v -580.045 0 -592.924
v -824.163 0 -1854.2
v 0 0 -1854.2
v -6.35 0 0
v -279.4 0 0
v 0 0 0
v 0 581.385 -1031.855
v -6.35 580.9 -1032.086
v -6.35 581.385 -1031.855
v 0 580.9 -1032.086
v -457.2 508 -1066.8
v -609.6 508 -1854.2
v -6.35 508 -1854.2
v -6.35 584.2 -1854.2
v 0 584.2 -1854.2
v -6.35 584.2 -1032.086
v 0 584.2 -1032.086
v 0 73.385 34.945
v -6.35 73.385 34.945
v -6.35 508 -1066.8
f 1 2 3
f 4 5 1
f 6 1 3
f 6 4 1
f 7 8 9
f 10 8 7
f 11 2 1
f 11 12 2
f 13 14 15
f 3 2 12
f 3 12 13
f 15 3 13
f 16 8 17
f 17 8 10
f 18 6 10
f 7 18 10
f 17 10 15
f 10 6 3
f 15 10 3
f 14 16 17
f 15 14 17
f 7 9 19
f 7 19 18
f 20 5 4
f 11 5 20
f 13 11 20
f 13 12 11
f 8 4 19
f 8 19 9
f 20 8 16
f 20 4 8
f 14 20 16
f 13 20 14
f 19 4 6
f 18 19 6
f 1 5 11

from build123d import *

# Parameters (mm, degrees)
BOSS_EXTRUDE1_DEPTH = 508
CUT_EXTRUDE1_DEPTH  = 508
BOSS_EXTRUDE2_DEPTH = 508
BOSS_EXTRUDE3_DEPTH = 635
CUT_EXTRUDE3_DEPTH  = 1016
CUT_EXTRUDE6_DEPTH  = 508
CUT_EXTRUDE7_DEPTH  = 1016
CUT_EXTRUDE8_DEPTH  = 1016
CUT_EXTRUDE9_DEPTH  = 1016
CUT_EXTRUDE10_DEPTH = 2092.737749488
SKETCH11_W          = 6.35
SKETCH11_H          = 822.114235363
BOSS_EXTRUDE4_DEPTH = 76.2
SKETCH12_W          = 6.35
SKETCH12_H          = 1181.577860321
BOSS_EXTRUDE5_DEPTH = 81.28


with BuildPart() as part:
    # Sketch1 → Boss-Extrude1 (new body)
    with BuildSketch(Plane(origin=(0, 0, 0), x_dir=(1, 0, 0), z_dir=(0, 1, 0))):
        Polygon((0, 1066.8), (0, 0), (279.4, 0), (457.2, 1066.8), align=None)
    boss_extrude1 = extrude(amount=BOSS_EXTRUDE1_DEPTH)

    # Sketch2 → Cut-Extrude1 (cut)
    with BuildSketch(Plane.ZY):
        Polygon((0, 0), (-1066.8, 508), (-1066.8, 732.672417782), (0, 732.672417782), align=None)
    cut_extrude1 = extrude(amount=-CUT_EXTRUDE1_DEPTH, mode=Mode.SUBTRACT)

    # Sketch3 → Boss-Extrude2 (add)
    with BuildSketch(Plane.XZ):
        Polygon((0, -1066.8), (0, -1854.2), (609.6, -1854.2), (457.2, -1066.8), align=None)
    boss_extrude2 = extrude(amount=-BOSS_EXTRUDE2_DEPTH)

    # Mirror1: Boss-Extrude1 across plane
    add(boss_extrude1.mirror(Plane(origin=(0, 508, -1066.8), x_dir=(0, 0, 1), z_dir=(1, 0, 0))))

    # Mirror1 2: Cut-Extrude1 across plane
    add(cut_extrude1.mirror(Plane(origin=(0, 508, -1066.8), x_dir=(0, 0, 1), z_dir=(1, 0, 0))), mode=Mode.SUBTRACT)


with BuildPart() as body_2:
    # Sketch4 → Boss-Extrude3 (new body)
    with BuildSketch(Plane.XZ):
        Polygon((279.4, 0), (758.024602406, -943.929756814), (824.163316724, -1854.2), (609.6, -1854.2), (473.605368522, -1854.2), (229.324151542, -858.00394067), align=None)
    boss_extrude3 = extrude(amount=-BOSS_EXTRUDE3_DEPTH)

    # Sketch5 → Cut-Extrude3 (cut)
    with BuildSketch(Plane(origin=(158.02566363, 112.959299077, 80.127753023), x_dir=(-0.31022668993908165, -0.22175505323400505, 0.924437178619848), z_dir=(-0.7520567447205982, -0.5375823192171424, -0.38133437136635806))):
        Polygon((-393.664649125, 703.625608499), (953.241894052, -176.928807588), (-1326.842790058, -923.556364957), (-2274.788319735, -628.326732027), (-2325.528348512, 172.375821483), align=None)
    cut_extrude3 = extrude(amount=-CUT_EXTRUDE3_DEPTH, mode=Mode.SUBTRACT)

    # Sketch6 → Cut-Extrude6 (cut)
    with BuildSketch(Plane(origin=(397.94007399, 254.27896004, 77.020659482), x_dir=(0.13564130705663138, 0.08667317707163243, -0.9869595717131874), z_dir=(0.8316697136780645, 0.5314270256083374, 0.16096833167962543))):
        Polygon((1082.533011894, 1261.854611528), (2538.800510351, 767.688534421), (2437.604130324, -1113.046367909), (306.999460867, -1023.580096849), align=None)
    cut_extrude6 = extrude(amount=CUT_EXTRUDE6_DEPTH, mode=Mode.SUBTRACT)

    # Sketch7 → Cut-Extrude7 (cut)
    with BuildSketch(Plane(origin=(0, 0, 0), x_dir=(1, 0, 0), z_dir=(0, 0.9028605188239303, 0.4299335803923477))):
        Polygon((0, 1181.577860321), (0, 0), (1197.045935399, 0), (1543.879463505, 955.927792479), (976.352766556, 2301.292030359), align=None)
    cut_extrude7 = extrude(amount=CUT_EXTRUDE7_DEPTH, mode=Mode.SUBTRACT)

    # Sketch8 → Cut-Extrude8 (cut)
    with BuildSketch(Plane(origin=(382.681643927, 161.632761359, 74.067414954), x_dir=(0.1616973556962576, 0.06829590736935992, -0.9844742933146776), z_dir=(0.9068988908525647, 0.38304573613058523, 0.1755288175843677))):
        Polygon((1197.556798458, 999.143883777), (2455.295967915, 323.49765858), (2410.705423203, -956.043074474), (776.288597468, -956.043074474), (430.351182168, -503.275200855), align=None)
    cut_extrude8 = extrude(amount=CUT_EXTRUDE8_DEPTH, mode=Mode.SUBTRACT)

    # Sketch9 → Cut-Extrude9 (cut)
    with BuildSketch(Plane(origin=(0, 508, 0), x_dir=(1, 0, 0), z_dir=(0, 1, 0))):
        Polygon((351.522364305, 2301.225932819), (1863.401978722, 1800.09916747), (1313.944223798, 629.194662402), (-286.938271333, 375.015467974), (-444.004316346, 1364.25568729), align=None)
    cut_extrude9 = extrude(amount=CUT_EXTRUDE9_DEPTH, mode=Mode.SUBTRACT)


with BuildPart() as part_1:
    add(part.part)

    # Mirror1 3: Boss-Extrude2, Boss-Extrude3 across plane
    add(boss_extrude2.mirror(Plane(origin=(0, 508, -1066.8), x_dir=(0, 0, 1), z_dir=(1, 0, 0))))
    add(boss_extrude3.mirror(Plane(origin=(0, 508, -1066.8), x_dir=(0, 0, 1), z_dir=(1, 0, 0))))

    # Mirror1 4: Cut-Extrude3, Cut-Extrude6, Cut-Extrude7, Cut-Extrude8, Cut-Extrude9 across plane
    add(cut_extrude3.mirror(Plane(origin=(0, 508, -1066.8), x_dir=(0, 0, 1), z_dir=(1, 0, 0))), mode=Mode.SUBTRACT)
    add(cut_extrude6.mirror(Plane(origin=(0, 508, -1066.8), x_dir=(0, 0, 1), z_dir=(1, 0, 0))), mode=Mode.SUBTRACT)
    add(cut_extrude7.mirror(Plane(origin=(0, 508, -1066.8), x_dir=(0, 0, 1), z_dir=(1, 0, 0))), mode=Mode.SUBTRACT)
    add(cut_extrude8.mirror(Plane(origin=(0, 508, -1066.8), x_dir=(0, 0, 1), z_dir=(1, 0, 0))), mode=Mode.SUBTRACT)
    add(cut_extrude9.mirror(Plane(origin=(0, 508, -1066.8), x_dir=(0, 0, 1), z_dir=(1, 0, 0))), mode=Mode.SUBTRACT)


with BuildPart() as cut_extrude10_tool:
    # Sketch10 → Cut-Extrude10 (new, through all)
    with BuildSketch(Plane(origin=(0, 0, 0), x_dir=(0, 0, -1), z_dir=(1, 0, 0))):
        Polygon((2306.148998717, 875.535830554), (458.236130604, 1137.326156156), (-514.568333215, 141.183628961), (336.70111329, -1596.655316262), (2036.802708671, -1025.71271333), (2740.096775658, -499.622195383), align=None)
    extrude(amount=CUT_EXTRUDE10_DEPTH)


with BuildPart() as part_2:
    add(part_1.part)

    # Cut-Extrude10: cut by cut_extrude10_tool
    add(cut_extrude10_tool.part, mode=Mode.SUBTRACT)

    # Sketch11 → Boss-Extrude4 (add)
    with BuildSketch(Plane(origin=(0, 508, 0), x_dir=(1, 0, 0), z_dir=(0, 1, 0))):
        with Locations((-3.175, 1443.142882319)):
            Rectangle(SKETCH11_W, SKETCH11_H)
    extrude(amount=BOSS_EXTRUDE4_DEPTH)

    # Sketch12 → Boss-Extrude5 (add)
    with BuildSketch(Plane(origin=(0, 0, 0), x_dir=(1, 0, 0), z_dir=(0, 0.9028605188239304, 0.42993358039234775))):
        with Locations((-3.175, 590.788930161)):
            Rectangle(SKETCH12_W, SKETCH12_H)
    extrude(amount=BOSS_EXTRUDE5_DEPTH)


with BuildPart() as body_2_1:
    add(body_2.part)

    # Cut-Extrude10: cut by cut_extrude10_tool
    add(cut_extrude10_tool.part, mode=Mode.SUBTRACT)


solid = part_2.part
